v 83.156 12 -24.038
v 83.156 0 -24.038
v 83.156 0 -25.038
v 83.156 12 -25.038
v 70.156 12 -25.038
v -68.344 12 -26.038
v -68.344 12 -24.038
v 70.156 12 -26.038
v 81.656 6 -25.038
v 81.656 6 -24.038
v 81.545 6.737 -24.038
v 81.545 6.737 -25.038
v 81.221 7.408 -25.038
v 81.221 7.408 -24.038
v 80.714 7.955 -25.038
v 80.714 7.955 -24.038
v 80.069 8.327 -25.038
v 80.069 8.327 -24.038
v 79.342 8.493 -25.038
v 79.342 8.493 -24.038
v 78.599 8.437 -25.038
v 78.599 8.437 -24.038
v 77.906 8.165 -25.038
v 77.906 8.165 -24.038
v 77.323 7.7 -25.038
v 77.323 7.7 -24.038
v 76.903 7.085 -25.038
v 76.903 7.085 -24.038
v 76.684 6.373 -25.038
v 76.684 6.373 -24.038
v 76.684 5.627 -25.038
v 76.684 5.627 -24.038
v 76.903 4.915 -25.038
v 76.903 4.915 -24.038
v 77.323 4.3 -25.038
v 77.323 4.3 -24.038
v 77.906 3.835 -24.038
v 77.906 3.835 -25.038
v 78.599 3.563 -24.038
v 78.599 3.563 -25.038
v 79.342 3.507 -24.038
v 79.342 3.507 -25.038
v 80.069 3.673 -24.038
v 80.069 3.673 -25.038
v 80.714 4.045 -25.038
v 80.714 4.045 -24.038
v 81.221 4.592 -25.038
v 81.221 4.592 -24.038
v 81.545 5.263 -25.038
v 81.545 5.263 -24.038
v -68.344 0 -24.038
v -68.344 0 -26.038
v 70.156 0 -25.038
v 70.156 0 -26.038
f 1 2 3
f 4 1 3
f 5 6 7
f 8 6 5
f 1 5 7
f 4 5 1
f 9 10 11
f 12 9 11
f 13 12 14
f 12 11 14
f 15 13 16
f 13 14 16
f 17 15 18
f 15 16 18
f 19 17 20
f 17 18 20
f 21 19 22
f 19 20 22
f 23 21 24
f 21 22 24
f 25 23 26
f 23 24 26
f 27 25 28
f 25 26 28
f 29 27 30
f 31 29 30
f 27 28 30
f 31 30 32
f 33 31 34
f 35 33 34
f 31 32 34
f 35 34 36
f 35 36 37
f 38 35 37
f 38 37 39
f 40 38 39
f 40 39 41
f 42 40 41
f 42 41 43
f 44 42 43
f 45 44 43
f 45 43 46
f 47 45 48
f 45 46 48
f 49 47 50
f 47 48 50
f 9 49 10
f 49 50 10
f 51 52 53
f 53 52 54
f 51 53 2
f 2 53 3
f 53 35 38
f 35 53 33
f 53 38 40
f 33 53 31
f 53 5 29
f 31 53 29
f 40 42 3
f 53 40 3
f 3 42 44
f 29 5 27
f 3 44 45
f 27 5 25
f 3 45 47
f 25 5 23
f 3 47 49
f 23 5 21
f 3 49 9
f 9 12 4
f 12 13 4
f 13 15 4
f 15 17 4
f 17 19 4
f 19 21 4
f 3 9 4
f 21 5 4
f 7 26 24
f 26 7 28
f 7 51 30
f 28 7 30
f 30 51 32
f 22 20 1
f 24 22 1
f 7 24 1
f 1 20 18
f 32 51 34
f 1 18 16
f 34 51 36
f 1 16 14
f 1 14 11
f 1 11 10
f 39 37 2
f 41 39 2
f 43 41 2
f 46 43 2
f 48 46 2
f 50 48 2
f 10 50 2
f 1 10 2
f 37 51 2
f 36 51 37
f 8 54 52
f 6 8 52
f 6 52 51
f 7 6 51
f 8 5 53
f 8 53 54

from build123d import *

# Parameters (mm, degrees)
SALIENTE_EXTRUIR1_DEPTH = 12
CROQUIS4_R              = 2.5
CORTAR_EXTRUIR1_DEPTH   = 1
CROQUIS5_R              = 1.5
CORTAR_EXTRUIR2_DEPTH   = 1
CROQUIS6_W              = 13
CROQUIS6_H              = 1
CORTAR_EXTRUIR3_DEPTH   = 12


with BuildPart() as part:
    # Croquis1 → Saliente-Extruir1 (new body)
    with BuildSketch(Plane(origin=(0, 0, 0), x_dir=(1, 0, 0), z_dir=(0, 1, 0))):
        Polygon((-65.844332906, 24.038216561), (83.155667094, 24.038216561), (83.155667094, 26.038216561), (-65.844332906, 26.038216561), (-68.344332906, 26.038216561), (-68.344332906, 24.038216561), align=None)
    extrude(amount=SALIENTE_EXTRUIR1_DEPTH)

    # Croquis4 → Cortar-Extruir1 (cut)
    with BuildSketch(Plane.XY.offset(-24.038216561)):
        with Locations((79.155667094, 6)):
            Circle(CROQUIS4_R)
    extrude(amount=-CORTAR_EXTRUIR1_DEPTH, mode=Mode.SUBTRACT)

    # Croquis5 → Cortar-Extruir2 (cut)
    with BuildSketch(Plane.XY.offset(-25.038216561)):
        with Locations((79.155667094, 6)):
            Circle(CROQUIS5_R)
    extrude(amount=-CORTAR_EXTRUIR2_DEPTH, mode=Mode.SUBTRACT)

    # Croquis6 → Cortar-Extruir3 (cut)
    with BuildSketch(Plane(origin=(0, 12, 0), x_dir=(1, 0, 0), z_dir=(0, 1, 0))):
        with Locations((76.655667094, 25.538216561)):
            Rectangle(CROQUIS6_W, CROQUIS6_H)
    extrude(amount=-CORTAR_EXTRUIR3_DEPTH, mode=Mode.SUBTRACT)


solid = part.part
